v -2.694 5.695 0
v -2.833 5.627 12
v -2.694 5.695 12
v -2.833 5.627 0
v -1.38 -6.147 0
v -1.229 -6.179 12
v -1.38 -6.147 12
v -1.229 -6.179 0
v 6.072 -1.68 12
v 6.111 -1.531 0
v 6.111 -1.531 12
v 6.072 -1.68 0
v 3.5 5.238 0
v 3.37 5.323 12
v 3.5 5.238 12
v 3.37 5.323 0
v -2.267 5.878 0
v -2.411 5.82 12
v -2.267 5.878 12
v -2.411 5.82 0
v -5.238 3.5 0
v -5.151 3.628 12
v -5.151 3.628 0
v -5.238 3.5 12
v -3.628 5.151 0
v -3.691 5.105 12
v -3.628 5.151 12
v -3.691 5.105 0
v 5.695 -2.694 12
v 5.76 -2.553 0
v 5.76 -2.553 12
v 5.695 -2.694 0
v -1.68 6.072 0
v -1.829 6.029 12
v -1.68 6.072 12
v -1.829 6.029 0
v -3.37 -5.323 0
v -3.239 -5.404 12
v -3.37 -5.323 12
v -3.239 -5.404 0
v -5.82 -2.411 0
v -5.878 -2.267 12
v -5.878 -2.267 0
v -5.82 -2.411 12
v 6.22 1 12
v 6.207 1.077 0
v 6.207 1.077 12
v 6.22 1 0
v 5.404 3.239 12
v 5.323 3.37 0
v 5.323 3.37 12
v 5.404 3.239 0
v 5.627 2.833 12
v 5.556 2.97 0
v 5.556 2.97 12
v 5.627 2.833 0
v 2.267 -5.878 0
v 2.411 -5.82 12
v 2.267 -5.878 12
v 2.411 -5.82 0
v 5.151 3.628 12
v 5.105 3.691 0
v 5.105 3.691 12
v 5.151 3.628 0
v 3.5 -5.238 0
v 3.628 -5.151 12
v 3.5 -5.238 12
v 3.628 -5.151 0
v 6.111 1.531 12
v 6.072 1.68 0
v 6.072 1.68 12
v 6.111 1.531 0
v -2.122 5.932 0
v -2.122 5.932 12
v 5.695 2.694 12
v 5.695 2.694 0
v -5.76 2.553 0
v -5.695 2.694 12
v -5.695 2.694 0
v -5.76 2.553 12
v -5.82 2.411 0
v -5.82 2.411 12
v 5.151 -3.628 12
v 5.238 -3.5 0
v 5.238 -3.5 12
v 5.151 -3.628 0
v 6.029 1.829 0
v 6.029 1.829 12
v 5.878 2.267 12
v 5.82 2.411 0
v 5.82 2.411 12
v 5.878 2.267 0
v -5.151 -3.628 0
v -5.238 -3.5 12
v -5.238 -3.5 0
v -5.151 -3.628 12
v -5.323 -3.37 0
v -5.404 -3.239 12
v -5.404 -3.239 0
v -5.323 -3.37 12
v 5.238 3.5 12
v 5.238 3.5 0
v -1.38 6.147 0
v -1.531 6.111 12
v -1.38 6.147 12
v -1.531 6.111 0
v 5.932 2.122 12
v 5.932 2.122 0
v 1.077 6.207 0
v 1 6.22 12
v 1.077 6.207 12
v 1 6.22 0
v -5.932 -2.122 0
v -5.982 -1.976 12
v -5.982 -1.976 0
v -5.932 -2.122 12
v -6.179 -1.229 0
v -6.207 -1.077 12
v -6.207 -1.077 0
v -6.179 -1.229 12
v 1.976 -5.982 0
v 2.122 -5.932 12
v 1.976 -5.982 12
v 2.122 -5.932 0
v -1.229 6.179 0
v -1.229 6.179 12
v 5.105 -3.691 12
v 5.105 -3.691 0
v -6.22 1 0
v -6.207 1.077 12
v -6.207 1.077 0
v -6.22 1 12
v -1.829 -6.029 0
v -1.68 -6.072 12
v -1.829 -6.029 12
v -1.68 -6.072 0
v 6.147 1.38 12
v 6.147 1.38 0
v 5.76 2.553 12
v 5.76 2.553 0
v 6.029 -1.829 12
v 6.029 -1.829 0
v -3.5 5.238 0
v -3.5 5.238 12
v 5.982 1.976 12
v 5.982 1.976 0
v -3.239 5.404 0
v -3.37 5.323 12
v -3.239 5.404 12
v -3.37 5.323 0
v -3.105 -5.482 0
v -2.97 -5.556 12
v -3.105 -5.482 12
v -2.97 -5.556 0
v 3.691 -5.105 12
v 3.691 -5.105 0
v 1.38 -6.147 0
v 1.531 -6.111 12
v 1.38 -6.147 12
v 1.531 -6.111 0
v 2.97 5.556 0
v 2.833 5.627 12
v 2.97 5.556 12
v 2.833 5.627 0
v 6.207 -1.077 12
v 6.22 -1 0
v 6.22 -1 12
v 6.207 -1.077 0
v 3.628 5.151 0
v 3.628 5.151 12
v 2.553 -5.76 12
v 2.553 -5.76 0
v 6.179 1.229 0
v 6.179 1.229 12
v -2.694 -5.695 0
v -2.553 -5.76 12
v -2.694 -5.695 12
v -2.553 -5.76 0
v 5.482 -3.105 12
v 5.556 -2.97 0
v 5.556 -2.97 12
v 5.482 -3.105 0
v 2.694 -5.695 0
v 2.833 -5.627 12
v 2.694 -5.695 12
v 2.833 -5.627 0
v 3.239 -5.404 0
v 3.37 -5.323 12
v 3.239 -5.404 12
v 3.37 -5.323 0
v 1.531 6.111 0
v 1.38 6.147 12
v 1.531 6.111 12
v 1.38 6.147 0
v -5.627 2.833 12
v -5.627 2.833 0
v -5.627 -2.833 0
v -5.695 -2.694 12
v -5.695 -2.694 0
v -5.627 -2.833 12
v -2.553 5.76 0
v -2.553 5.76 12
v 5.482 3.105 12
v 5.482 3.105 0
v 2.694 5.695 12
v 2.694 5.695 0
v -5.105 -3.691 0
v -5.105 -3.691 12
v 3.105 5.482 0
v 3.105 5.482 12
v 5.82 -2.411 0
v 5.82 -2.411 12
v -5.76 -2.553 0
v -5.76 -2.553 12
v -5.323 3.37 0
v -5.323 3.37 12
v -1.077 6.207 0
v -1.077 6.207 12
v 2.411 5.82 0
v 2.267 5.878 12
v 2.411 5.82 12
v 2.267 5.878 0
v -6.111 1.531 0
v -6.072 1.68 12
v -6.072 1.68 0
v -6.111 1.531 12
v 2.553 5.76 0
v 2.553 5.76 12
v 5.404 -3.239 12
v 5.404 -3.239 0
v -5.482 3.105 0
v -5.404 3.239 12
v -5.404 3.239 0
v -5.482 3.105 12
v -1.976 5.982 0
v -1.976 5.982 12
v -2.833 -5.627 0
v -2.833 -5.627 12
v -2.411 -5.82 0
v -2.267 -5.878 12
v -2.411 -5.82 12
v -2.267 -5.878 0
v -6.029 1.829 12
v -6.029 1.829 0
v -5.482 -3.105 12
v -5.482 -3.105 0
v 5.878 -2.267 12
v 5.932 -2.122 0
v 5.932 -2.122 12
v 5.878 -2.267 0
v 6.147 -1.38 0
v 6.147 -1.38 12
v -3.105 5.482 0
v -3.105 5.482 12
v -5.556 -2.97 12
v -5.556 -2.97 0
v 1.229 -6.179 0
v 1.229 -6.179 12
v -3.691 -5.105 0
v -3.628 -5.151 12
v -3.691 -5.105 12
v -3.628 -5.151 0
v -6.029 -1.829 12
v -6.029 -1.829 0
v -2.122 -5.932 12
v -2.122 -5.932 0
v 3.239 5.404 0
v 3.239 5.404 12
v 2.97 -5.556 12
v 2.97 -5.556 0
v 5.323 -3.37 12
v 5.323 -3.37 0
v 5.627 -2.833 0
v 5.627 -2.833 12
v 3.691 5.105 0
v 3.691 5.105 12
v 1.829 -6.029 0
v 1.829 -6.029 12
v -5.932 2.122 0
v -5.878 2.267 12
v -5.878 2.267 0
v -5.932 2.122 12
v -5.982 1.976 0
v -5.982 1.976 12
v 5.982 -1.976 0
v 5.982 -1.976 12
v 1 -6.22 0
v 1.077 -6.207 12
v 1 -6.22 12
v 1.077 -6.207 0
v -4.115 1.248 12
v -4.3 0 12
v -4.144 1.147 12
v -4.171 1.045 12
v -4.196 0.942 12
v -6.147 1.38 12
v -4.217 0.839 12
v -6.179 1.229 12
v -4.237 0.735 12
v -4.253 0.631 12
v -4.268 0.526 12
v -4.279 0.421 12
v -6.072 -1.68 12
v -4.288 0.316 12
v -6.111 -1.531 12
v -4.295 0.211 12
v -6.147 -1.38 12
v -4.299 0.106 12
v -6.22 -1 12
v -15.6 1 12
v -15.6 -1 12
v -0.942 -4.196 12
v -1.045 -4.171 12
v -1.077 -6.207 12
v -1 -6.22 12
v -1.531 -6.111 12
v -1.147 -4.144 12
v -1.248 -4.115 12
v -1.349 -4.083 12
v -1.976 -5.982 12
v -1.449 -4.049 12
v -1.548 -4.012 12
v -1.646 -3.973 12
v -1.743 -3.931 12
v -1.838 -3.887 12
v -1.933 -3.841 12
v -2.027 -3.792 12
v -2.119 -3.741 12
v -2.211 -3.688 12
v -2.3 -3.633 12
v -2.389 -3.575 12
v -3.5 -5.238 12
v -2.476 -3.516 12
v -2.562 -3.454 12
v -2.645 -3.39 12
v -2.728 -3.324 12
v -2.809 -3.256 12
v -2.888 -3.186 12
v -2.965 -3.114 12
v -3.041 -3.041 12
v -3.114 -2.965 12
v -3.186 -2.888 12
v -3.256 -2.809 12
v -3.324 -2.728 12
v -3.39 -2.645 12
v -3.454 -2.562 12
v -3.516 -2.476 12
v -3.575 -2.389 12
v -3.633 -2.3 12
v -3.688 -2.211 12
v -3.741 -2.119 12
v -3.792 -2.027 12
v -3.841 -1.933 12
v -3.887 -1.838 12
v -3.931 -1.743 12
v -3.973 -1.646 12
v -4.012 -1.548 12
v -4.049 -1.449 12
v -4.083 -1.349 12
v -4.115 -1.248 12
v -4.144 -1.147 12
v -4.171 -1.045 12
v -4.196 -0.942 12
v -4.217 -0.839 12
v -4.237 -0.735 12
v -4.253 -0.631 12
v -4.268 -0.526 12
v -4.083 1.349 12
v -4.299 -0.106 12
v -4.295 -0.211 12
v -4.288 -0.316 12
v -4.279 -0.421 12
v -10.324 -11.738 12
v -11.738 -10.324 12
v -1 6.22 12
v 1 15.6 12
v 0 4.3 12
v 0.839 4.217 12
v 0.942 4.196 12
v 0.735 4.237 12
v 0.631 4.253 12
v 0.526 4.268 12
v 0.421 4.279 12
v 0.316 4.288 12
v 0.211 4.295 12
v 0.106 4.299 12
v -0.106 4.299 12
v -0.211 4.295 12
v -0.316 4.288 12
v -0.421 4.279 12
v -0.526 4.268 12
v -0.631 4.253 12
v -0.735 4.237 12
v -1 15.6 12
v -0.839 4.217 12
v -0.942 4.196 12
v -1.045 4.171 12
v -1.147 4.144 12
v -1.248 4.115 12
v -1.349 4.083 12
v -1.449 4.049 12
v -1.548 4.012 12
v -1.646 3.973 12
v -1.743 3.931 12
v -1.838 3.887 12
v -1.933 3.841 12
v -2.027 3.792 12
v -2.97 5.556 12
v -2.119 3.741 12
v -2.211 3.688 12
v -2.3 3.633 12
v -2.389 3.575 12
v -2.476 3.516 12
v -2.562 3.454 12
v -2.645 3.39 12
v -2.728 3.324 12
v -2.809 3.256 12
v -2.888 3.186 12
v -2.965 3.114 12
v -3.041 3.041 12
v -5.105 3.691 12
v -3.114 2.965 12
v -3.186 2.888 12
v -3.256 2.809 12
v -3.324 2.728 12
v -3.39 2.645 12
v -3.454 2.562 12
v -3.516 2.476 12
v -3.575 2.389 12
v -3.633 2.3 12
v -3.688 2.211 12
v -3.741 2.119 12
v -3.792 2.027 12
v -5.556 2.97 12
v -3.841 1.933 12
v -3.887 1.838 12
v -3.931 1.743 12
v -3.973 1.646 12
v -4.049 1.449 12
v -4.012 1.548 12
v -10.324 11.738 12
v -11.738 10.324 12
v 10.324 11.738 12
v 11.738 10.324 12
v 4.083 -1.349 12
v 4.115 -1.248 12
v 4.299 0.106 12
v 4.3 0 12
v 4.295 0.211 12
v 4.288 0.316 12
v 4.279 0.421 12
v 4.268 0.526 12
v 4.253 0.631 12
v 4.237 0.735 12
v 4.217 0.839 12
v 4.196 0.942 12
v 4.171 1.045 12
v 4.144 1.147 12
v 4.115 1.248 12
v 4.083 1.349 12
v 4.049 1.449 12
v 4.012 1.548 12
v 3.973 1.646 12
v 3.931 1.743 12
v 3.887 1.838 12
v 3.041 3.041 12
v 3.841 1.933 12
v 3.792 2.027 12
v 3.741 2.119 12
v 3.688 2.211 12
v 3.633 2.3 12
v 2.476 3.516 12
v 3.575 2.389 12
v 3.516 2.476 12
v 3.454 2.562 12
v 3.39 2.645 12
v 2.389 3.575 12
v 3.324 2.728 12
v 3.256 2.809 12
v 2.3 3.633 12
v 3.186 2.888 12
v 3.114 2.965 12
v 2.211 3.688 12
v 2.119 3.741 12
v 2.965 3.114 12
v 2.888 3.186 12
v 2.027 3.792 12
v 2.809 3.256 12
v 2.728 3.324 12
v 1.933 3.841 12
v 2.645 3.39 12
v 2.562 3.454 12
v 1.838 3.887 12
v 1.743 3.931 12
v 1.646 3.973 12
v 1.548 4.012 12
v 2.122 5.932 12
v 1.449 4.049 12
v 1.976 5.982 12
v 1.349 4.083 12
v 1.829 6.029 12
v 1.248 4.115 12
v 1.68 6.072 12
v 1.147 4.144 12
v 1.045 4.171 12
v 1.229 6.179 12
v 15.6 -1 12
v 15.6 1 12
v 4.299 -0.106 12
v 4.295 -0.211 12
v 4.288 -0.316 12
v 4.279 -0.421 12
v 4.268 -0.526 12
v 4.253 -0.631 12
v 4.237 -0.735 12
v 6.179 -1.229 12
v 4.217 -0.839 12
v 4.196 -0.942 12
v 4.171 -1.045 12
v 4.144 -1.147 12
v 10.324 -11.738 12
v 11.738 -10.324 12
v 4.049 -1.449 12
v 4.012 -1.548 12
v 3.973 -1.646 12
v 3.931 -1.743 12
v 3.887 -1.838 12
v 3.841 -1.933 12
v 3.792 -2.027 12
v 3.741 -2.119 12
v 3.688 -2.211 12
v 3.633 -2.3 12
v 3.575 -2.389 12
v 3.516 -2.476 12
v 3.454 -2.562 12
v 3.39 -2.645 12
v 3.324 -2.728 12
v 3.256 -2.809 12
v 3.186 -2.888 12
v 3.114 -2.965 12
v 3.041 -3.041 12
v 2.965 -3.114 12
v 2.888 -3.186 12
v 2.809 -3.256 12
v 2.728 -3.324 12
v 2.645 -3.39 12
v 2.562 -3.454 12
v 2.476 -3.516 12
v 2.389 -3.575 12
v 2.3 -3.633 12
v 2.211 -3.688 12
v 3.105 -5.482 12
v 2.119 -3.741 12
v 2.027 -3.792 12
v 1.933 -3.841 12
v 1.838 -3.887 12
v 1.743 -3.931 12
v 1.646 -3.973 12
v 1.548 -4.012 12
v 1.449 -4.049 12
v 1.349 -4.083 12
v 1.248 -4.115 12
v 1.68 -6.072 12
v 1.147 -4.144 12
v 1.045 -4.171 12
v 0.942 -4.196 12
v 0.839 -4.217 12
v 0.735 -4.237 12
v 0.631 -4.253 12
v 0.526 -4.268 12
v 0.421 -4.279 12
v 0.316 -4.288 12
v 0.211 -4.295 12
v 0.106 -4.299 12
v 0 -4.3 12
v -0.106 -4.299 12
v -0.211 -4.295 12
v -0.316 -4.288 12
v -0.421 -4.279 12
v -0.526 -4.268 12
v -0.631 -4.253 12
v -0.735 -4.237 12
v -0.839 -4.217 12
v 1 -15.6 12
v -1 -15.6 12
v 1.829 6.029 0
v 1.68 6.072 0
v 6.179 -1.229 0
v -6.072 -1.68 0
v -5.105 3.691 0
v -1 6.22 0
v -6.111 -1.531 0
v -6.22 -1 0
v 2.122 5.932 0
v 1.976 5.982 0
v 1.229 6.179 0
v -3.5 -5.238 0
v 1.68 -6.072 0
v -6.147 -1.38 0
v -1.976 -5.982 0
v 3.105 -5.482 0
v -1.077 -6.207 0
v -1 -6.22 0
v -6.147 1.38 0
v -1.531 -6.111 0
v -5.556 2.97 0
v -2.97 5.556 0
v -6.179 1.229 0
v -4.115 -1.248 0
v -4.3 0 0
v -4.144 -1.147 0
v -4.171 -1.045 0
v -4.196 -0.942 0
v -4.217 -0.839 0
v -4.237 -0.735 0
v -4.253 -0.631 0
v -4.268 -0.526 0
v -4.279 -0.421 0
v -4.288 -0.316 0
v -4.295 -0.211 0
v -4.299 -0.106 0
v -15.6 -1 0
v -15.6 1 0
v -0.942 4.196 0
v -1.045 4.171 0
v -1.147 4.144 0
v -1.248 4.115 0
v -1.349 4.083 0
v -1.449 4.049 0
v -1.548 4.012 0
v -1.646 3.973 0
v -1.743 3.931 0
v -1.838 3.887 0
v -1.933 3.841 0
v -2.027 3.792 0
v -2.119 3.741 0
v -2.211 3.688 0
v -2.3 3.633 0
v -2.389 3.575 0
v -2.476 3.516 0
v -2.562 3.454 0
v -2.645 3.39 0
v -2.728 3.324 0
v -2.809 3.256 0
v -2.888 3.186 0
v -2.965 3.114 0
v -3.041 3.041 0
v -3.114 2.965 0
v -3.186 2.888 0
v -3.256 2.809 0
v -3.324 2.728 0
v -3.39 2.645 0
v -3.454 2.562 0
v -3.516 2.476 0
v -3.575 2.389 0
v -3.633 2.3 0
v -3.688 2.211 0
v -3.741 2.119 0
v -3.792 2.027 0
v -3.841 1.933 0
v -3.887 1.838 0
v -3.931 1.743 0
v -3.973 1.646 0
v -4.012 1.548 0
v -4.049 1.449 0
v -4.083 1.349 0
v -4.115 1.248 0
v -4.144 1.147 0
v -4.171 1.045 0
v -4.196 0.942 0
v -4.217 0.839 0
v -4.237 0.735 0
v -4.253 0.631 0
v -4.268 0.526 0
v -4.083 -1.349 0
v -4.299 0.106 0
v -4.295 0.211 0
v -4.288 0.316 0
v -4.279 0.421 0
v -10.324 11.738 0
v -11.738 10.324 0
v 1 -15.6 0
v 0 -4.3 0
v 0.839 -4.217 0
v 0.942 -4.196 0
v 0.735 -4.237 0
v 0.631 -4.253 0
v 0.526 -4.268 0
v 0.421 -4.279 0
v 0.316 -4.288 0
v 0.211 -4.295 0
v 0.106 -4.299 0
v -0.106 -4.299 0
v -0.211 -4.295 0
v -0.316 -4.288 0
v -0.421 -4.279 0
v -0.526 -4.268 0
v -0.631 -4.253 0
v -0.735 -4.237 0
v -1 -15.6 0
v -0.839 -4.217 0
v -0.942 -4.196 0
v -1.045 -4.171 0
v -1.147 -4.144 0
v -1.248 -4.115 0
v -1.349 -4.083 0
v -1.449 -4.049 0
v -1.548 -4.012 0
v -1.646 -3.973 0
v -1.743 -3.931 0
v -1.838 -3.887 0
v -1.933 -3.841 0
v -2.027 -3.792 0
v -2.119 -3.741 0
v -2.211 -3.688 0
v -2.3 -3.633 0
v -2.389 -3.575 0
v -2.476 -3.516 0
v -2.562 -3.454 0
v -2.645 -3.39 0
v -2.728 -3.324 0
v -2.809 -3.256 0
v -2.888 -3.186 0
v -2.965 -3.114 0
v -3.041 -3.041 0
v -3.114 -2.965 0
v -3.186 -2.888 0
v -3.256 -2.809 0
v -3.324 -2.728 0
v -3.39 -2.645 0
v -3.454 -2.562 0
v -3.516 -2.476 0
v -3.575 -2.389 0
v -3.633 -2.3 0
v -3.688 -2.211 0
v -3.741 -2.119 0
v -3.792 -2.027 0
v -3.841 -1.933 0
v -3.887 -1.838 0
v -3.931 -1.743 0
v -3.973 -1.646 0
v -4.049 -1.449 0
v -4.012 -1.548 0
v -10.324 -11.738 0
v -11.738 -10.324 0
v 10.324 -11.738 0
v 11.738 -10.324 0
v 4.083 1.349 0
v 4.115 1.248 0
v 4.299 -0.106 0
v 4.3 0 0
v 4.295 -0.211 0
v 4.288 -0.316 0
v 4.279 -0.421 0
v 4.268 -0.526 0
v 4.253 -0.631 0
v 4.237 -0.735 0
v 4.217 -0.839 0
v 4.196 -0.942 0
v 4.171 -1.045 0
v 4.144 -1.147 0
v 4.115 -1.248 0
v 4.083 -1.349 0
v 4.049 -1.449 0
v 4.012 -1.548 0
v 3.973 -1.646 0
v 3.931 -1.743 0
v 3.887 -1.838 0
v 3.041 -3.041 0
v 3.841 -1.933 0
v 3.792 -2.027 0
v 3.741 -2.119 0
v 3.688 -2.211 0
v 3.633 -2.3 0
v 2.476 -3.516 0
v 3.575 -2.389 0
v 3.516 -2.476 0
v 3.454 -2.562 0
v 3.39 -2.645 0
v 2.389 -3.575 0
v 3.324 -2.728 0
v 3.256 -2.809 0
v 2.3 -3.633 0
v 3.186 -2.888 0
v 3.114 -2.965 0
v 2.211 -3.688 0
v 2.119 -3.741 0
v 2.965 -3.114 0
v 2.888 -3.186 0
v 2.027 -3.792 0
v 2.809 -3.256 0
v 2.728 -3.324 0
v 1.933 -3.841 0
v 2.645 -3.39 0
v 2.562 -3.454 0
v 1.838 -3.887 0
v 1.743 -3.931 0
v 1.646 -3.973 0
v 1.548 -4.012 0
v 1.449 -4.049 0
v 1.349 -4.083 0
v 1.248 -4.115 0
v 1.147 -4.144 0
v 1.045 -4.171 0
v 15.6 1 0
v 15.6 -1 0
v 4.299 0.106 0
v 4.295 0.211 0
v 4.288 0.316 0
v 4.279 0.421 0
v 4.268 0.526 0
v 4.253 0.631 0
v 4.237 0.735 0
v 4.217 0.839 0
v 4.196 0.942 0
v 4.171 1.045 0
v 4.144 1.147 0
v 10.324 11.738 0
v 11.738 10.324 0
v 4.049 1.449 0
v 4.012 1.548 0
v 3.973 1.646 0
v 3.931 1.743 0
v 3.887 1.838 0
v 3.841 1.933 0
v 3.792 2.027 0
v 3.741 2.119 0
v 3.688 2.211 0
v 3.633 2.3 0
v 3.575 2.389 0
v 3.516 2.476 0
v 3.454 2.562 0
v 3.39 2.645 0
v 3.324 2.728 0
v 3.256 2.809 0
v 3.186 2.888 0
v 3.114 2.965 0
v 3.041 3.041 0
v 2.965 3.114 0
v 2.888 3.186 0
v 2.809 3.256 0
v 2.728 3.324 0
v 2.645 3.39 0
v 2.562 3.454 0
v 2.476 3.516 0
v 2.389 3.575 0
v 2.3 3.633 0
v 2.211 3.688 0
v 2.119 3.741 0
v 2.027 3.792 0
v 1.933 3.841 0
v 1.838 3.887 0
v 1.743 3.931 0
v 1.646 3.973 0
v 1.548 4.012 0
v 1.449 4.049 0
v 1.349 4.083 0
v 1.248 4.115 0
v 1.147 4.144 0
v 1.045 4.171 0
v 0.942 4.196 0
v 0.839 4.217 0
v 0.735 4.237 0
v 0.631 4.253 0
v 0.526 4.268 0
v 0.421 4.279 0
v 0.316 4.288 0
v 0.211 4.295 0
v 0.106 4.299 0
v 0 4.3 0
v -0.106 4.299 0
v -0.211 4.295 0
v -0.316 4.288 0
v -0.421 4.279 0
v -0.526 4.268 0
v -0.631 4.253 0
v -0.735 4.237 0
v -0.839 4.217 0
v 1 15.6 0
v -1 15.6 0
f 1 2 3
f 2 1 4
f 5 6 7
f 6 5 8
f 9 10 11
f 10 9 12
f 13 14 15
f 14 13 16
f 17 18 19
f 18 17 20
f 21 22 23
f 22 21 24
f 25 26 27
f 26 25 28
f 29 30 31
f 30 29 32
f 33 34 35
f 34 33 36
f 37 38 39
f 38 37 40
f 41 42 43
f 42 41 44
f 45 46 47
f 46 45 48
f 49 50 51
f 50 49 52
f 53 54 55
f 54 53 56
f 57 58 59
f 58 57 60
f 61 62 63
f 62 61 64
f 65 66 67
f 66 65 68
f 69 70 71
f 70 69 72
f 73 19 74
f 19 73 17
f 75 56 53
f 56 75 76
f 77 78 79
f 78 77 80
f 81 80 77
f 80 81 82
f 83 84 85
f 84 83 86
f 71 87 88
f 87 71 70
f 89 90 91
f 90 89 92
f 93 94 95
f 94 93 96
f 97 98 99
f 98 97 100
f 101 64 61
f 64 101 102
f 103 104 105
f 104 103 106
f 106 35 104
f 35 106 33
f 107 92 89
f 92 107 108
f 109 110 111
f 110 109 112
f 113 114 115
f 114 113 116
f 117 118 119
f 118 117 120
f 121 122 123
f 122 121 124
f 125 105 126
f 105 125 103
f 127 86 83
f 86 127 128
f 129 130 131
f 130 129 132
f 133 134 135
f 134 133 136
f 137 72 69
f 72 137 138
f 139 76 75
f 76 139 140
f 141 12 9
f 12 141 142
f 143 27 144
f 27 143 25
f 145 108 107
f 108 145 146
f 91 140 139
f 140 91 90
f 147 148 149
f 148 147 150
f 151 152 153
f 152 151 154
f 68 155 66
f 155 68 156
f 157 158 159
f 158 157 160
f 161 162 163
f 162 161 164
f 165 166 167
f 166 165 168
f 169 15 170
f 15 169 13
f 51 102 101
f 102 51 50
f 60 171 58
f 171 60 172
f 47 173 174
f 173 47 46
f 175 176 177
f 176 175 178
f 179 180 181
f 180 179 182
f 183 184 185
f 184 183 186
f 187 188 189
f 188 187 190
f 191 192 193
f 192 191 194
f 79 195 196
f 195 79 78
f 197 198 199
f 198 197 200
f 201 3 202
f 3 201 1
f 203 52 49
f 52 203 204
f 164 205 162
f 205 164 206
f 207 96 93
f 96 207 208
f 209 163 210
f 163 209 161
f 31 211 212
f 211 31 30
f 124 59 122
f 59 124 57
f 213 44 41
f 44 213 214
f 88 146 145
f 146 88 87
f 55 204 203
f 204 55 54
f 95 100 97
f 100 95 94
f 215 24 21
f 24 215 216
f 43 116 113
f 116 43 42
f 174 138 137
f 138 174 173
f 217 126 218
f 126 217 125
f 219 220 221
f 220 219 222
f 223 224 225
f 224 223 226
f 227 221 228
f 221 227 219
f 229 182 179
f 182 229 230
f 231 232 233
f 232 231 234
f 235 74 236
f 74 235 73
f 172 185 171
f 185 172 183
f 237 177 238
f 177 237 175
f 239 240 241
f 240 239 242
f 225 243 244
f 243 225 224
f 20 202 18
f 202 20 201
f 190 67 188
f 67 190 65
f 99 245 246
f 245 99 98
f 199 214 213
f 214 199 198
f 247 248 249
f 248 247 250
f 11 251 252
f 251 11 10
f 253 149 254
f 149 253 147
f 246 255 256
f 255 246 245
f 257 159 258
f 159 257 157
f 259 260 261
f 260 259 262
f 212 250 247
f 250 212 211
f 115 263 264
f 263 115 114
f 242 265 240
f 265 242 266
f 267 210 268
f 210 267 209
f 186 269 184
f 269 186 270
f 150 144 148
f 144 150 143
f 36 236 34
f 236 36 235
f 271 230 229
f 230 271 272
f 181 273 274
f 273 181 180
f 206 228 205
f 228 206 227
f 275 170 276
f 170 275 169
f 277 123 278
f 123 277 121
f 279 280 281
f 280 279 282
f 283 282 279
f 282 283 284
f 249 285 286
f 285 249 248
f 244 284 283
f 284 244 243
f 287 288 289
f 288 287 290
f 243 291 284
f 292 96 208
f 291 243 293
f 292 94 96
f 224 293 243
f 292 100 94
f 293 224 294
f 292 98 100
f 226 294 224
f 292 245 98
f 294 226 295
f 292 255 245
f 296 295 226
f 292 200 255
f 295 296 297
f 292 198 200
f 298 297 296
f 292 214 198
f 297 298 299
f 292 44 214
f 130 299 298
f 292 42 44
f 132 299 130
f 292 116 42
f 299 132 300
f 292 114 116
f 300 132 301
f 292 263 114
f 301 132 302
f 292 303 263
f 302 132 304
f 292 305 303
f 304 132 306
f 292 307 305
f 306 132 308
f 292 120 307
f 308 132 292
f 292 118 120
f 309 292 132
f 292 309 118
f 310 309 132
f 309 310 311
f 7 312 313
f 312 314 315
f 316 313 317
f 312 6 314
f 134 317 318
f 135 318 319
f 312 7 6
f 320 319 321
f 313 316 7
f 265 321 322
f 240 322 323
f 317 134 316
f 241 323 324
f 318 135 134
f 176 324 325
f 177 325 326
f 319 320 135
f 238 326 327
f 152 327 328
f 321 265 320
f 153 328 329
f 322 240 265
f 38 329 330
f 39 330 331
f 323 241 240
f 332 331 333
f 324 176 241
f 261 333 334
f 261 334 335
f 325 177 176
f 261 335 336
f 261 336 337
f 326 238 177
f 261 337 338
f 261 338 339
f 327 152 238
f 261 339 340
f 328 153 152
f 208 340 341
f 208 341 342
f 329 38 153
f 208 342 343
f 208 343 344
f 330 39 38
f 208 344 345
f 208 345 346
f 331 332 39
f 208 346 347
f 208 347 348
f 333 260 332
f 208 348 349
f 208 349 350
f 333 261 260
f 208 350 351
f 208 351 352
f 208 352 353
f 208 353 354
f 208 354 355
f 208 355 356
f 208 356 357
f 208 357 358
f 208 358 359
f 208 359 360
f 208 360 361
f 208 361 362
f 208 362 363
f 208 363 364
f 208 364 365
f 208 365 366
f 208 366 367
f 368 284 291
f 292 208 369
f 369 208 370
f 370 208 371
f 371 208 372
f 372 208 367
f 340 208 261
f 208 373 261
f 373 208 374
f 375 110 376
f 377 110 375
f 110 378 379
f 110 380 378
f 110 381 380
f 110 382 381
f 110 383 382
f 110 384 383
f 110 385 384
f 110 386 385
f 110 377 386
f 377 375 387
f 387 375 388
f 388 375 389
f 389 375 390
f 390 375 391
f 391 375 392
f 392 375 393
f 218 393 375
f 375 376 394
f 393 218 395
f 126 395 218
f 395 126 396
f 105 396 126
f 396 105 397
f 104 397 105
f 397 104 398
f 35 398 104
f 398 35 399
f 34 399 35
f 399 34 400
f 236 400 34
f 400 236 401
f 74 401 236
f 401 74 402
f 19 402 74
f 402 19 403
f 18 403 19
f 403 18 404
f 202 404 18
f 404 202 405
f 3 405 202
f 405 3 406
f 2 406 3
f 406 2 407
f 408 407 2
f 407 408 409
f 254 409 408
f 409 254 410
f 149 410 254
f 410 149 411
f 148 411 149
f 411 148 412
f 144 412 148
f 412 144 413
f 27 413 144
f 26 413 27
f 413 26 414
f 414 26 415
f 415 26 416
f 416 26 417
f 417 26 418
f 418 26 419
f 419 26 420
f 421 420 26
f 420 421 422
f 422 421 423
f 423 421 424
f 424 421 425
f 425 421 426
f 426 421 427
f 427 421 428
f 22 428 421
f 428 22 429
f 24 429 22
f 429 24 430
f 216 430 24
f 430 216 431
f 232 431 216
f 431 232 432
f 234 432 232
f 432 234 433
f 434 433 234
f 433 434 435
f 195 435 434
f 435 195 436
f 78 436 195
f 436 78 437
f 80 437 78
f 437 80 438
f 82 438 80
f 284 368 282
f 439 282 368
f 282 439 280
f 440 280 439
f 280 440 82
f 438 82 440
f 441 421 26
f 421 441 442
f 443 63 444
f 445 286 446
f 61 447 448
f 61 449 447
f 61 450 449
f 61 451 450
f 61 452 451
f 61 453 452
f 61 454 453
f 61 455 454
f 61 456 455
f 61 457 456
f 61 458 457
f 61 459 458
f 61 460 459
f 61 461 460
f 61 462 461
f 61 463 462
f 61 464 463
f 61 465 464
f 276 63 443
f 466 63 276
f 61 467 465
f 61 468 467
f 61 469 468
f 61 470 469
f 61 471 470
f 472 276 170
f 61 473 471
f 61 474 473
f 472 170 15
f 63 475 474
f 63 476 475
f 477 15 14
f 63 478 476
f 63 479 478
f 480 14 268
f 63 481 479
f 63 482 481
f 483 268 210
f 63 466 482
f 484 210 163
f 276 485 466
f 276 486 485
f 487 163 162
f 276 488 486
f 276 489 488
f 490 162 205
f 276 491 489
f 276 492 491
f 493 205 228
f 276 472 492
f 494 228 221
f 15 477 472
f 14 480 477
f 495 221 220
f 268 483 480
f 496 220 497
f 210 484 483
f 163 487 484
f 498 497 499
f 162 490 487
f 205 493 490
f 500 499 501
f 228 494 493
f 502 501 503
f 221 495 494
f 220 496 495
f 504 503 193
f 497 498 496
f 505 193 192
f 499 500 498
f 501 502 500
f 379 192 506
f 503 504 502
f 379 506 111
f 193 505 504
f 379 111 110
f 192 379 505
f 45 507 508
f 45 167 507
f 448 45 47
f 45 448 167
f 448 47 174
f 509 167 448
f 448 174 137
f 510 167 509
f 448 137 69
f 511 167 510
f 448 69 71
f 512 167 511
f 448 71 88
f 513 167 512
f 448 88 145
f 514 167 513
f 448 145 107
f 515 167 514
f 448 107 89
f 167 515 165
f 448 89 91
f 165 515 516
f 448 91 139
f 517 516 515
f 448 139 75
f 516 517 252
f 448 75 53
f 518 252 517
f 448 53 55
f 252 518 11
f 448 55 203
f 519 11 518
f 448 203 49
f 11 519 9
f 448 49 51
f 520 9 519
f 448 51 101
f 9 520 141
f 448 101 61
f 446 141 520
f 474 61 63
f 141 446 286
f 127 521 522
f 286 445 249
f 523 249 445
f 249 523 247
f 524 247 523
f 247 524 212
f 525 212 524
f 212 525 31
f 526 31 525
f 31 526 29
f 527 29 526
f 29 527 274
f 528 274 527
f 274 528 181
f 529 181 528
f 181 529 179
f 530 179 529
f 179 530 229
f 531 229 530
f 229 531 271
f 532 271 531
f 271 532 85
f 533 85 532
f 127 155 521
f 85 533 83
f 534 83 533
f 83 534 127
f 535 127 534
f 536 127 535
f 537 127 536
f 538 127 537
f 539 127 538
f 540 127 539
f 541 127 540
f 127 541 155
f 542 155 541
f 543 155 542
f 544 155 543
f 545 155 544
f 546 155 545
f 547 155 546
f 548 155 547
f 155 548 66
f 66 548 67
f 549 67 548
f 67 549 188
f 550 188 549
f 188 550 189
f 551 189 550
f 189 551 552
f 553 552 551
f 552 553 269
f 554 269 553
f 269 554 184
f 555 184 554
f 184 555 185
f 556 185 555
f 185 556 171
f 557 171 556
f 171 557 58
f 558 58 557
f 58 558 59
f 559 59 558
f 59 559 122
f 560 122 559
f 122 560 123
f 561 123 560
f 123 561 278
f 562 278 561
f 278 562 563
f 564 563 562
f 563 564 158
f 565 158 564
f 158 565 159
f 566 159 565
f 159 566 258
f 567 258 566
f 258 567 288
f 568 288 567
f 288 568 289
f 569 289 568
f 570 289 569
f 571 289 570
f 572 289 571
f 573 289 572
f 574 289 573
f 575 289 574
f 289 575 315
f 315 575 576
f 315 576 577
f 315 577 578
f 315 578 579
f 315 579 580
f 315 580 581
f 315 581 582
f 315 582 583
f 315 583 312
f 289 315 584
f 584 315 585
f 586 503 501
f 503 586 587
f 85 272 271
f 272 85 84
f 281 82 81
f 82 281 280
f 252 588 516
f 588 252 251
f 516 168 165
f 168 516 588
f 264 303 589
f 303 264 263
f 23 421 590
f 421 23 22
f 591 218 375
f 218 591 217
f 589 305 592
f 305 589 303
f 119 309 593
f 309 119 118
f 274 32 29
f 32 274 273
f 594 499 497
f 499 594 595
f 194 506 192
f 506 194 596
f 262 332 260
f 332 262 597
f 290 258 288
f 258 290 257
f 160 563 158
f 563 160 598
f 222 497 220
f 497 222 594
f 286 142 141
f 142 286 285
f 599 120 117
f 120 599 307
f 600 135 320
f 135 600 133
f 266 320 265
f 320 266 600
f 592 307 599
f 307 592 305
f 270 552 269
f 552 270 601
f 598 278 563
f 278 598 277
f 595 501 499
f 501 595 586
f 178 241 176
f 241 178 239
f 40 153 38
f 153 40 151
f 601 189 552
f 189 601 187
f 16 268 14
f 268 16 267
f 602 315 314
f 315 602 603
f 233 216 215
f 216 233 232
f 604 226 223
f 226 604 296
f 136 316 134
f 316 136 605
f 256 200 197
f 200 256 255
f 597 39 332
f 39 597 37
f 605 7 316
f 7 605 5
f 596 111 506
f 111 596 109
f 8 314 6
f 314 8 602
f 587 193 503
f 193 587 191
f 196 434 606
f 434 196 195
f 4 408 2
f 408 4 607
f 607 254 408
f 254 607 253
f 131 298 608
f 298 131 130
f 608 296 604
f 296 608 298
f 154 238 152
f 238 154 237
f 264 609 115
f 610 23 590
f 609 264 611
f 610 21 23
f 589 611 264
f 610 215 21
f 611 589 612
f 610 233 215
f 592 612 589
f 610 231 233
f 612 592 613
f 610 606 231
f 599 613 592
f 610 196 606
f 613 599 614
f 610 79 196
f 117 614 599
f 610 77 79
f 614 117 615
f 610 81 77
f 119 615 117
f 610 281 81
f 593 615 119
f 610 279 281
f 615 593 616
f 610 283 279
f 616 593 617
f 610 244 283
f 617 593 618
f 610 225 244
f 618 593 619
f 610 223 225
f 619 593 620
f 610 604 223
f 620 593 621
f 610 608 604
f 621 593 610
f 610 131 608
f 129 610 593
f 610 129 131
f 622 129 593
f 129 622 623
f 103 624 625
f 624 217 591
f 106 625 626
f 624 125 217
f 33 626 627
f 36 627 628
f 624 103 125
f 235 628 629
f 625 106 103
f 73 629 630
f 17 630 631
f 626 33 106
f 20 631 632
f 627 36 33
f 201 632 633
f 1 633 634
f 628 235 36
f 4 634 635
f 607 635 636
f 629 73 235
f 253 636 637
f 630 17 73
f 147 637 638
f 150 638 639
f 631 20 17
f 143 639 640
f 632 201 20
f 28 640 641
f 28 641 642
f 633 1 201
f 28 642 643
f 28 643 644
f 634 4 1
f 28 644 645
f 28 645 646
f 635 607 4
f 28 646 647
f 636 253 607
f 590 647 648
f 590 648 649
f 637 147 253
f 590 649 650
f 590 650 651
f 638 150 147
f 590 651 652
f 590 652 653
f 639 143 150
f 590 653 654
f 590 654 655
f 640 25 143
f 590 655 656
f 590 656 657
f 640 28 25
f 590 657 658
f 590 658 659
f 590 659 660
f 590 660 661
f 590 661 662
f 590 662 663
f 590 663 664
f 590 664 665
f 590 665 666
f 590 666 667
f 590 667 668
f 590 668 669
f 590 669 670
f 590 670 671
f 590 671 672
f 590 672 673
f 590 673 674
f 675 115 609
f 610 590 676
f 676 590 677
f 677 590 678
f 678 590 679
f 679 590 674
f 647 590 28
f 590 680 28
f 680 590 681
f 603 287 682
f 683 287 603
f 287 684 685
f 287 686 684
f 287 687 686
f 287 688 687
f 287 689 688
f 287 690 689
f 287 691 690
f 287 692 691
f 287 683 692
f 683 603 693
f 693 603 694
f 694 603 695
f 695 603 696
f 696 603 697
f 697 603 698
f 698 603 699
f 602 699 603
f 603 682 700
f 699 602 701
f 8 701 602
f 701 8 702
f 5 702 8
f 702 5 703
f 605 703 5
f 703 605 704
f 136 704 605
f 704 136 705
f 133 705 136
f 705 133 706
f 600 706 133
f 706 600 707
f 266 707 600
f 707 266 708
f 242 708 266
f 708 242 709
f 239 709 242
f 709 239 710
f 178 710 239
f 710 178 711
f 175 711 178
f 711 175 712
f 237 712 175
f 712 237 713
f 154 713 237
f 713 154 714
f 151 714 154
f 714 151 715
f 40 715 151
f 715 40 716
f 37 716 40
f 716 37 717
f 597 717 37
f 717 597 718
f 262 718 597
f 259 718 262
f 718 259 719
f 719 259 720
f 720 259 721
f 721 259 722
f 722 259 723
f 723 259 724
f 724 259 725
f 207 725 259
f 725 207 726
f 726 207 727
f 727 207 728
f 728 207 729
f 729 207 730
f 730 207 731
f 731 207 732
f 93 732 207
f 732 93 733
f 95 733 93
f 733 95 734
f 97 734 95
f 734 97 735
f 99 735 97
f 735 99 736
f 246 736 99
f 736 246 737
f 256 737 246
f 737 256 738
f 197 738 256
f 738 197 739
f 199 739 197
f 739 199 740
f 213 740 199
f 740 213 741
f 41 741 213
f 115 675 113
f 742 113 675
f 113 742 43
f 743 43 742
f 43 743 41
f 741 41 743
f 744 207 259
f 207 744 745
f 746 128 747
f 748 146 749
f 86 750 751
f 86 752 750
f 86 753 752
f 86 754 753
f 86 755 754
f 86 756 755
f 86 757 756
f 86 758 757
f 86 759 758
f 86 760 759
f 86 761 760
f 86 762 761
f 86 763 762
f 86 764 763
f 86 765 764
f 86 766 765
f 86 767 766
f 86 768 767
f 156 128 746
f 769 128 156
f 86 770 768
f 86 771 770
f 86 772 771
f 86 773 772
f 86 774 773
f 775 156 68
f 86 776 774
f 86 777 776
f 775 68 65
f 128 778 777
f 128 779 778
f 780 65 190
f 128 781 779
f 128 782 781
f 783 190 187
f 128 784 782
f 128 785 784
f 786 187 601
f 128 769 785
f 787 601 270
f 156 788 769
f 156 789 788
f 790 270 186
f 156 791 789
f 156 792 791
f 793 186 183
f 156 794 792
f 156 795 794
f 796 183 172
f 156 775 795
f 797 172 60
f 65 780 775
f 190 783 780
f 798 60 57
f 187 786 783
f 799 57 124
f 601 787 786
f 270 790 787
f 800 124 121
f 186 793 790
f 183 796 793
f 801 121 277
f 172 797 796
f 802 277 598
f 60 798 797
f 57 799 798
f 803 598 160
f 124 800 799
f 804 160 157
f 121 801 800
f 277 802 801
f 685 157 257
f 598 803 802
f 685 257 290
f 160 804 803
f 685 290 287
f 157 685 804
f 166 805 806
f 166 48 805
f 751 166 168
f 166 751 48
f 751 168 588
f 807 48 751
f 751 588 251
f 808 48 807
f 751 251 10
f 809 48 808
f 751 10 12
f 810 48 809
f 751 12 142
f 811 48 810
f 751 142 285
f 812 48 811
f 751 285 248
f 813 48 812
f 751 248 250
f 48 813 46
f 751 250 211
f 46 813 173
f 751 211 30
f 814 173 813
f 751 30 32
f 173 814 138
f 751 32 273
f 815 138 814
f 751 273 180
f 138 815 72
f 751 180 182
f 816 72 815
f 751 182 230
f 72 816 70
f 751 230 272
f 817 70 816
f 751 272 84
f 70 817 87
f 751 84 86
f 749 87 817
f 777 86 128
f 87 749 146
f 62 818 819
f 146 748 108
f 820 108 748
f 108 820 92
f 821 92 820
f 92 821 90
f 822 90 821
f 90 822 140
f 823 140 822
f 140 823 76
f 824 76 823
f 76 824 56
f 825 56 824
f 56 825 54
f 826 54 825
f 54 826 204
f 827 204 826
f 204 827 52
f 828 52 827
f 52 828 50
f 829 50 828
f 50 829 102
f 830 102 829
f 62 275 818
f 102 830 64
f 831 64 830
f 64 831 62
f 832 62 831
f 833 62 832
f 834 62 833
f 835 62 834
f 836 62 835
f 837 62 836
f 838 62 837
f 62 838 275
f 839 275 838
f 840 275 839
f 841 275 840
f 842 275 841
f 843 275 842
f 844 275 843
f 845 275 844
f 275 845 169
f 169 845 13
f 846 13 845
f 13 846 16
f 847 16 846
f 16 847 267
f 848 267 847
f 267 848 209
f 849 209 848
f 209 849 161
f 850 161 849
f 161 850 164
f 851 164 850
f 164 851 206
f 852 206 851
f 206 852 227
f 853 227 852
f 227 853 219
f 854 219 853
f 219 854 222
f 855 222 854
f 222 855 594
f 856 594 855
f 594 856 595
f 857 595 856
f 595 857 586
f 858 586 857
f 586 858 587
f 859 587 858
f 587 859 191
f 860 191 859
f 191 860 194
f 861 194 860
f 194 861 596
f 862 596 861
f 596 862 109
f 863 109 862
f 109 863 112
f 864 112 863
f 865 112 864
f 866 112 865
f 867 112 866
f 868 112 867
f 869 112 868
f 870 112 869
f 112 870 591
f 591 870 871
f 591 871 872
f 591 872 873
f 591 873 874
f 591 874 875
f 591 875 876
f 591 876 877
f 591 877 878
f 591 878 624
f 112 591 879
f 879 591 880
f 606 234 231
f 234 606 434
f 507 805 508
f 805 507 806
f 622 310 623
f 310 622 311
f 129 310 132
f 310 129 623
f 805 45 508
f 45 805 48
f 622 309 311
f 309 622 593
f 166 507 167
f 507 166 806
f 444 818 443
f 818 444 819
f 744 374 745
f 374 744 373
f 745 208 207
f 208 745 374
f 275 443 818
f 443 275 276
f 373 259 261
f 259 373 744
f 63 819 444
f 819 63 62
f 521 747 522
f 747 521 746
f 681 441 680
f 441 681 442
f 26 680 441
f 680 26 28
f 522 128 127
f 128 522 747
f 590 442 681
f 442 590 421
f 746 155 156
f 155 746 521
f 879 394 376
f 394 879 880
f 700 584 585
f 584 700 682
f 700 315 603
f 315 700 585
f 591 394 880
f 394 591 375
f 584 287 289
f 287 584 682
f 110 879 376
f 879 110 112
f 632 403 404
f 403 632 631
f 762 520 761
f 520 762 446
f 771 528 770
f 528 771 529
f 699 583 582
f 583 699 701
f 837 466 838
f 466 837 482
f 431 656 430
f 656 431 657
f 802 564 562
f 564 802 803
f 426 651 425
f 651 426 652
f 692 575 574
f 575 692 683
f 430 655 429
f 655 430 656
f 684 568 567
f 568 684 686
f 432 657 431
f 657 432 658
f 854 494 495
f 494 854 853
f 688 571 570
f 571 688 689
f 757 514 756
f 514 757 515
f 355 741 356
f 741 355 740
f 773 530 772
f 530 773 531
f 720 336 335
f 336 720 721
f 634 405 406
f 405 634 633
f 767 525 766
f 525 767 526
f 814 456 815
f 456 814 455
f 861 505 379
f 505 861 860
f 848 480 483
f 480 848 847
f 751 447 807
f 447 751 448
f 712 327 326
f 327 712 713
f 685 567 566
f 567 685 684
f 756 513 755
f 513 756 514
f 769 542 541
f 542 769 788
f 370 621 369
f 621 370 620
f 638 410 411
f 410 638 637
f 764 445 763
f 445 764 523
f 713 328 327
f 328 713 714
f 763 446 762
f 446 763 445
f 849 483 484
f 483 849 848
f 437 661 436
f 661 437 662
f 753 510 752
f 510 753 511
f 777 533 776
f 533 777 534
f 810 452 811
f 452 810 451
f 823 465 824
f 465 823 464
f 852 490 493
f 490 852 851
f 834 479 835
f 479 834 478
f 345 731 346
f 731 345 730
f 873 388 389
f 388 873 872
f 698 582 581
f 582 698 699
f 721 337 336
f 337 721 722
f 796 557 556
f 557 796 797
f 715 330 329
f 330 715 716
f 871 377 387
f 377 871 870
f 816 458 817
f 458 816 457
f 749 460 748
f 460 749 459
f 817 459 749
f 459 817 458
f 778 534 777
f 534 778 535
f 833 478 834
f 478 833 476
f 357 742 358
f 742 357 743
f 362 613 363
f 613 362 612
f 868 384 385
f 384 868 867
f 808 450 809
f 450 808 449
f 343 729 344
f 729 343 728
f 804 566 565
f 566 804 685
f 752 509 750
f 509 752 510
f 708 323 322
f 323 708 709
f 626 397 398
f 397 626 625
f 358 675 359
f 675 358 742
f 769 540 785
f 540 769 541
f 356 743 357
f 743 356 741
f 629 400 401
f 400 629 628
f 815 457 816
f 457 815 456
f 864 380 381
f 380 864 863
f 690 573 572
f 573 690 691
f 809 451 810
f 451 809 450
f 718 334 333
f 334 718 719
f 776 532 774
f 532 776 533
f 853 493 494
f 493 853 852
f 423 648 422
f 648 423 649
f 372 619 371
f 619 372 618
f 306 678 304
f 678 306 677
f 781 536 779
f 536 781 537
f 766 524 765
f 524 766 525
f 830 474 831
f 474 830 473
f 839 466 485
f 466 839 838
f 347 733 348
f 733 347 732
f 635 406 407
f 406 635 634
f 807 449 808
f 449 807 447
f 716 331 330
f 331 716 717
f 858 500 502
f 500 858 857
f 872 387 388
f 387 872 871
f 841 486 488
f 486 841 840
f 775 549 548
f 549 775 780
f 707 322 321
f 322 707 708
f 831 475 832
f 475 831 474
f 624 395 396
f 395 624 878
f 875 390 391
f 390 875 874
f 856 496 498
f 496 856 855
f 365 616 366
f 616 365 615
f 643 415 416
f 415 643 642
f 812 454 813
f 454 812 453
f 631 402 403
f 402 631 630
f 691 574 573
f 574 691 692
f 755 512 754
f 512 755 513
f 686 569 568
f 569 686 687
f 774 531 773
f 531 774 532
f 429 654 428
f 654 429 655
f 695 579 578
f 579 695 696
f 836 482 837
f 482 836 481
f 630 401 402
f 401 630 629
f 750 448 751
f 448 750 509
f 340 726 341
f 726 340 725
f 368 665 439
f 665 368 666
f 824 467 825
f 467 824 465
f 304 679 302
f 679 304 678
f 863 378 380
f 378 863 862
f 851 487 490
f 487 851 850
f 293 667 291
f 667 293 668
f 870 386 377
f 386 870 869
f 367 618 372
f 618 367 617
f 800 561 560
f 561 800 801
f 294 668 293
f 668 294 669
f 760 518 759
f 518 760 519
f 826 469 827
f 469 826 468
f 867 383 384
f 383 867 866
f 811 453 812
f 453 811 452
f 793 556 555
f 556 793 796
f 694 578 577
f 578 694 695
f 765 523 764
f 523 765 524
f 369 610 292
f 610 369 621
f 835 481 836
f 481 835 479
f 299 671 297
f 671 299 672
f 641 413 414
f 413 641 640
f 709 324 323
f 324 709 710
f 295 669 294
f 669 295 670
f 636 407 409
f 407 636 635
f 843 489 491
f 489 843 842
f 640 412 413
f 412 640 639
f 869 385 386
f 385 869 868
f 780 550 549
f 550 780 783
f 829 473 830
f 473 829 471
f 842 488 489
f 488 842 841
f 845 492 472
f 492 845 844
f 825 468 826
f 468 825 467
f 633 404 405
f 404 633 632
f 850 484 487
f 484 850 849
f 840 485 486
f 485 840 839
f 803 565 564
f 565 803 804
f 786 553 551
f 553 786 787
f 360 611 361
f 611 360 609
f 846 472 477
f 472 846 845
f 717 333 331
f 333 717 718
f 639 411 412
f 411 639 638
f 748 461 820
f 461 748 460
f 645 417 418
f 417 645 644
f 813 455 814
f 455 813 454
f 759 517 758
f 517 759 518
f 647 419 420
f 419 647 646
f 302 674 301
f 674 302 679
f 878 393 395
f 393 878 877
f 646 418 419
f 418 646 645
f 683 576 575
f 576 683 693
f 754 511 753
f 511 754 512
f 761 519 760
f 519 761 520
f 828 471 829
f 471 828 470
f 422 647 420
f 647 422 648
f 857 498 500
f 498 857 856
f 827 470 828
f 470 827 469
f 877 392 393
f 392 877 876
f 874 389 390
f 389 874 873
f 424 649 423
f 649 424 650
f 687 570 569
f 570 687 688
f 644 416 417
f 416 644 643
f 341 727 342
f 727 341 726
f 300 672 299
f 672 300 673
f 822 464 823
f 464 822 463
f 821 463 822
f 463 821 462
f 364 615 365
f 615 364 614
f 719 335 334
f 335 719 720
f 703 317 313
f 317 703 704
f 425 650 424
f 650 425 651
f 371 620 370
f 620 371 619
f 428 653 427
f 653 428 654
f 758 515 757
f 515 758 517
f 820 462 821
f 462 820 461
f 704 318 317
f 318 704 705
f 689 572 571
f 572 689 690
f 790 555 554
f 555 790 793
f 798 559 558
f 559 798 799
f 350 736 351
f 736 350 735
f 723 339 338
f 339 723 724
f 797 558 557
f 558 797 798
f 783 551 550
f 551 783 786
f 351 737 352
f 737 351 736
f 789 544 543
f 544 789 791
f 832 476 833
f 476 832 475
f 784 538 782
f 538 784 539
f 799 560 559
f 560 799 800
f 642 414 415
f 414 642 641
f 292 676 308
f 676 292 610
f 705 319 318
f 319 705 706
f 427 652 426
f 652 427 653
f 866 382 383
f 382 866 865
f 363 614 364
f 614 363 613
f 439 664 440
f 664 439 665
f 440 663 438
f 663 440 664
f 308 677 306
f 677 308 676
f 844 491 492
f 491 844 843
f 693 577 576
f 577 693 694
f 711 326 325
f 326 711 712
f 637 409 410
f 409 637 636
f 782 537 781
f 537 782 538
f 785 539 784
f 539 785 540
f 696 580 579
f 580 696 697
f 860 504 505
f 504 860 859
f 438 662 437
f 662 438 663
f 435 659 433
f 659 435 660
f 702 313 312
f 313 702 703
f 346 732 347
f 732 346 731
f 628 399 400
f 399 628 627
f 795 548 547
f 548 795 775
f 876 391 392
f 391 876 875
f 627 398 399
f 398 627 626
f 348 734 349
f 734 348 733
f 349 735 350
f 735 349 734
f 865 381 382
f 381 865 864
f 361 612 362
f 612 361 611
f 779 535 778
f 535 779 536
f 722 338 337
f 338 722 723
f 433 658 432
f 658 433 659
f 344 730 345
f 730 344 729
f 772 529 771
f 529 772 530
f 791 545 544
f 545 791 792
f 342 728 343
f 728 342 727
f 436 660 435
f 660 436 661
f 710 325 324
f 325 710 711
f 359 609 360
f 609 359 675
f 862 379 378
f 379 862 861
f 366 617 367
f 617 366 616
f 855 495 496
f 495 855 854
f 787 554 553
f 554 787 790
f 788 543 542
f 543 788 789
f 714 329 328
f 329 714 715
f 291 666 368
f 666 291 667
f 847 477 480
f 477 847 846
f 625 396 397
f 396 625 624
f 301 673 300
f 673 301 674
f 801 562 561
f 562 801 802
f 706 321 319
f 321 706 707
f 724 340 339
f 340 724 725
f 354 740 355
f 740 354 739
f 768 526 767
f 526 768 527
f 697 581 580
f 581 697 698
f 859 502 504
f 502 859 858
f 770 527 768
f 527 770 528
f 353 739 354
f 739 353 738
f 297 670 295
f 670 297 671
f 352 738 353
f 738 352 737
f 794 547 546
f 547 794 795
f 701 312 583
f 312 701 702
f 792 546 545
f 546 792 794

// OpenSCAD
$fn = 256;
id = 8.6;

w = id*2+14;

h = 12;

th = 2;

wth = 2;


difference()
{
union()
{
    
    cylinder(d=id+wth*2, h=h);
    
    translate([-w/2,-th/2,0])
    cube([w,th,h]);

    rotate([0,0,45])
    translate([-w/2,-th/2,0])
    cube([w,th,h]);

    rotate([0,0,-45])
    translate([-w/2,-th/2,0])
    cube([w,th,h]);


    rotate([0,0,90])
    translate([-w/2,-th/2,0])
    cube([w,th,h]);
    
}

cylinder(d=id, h=h+1);
}
